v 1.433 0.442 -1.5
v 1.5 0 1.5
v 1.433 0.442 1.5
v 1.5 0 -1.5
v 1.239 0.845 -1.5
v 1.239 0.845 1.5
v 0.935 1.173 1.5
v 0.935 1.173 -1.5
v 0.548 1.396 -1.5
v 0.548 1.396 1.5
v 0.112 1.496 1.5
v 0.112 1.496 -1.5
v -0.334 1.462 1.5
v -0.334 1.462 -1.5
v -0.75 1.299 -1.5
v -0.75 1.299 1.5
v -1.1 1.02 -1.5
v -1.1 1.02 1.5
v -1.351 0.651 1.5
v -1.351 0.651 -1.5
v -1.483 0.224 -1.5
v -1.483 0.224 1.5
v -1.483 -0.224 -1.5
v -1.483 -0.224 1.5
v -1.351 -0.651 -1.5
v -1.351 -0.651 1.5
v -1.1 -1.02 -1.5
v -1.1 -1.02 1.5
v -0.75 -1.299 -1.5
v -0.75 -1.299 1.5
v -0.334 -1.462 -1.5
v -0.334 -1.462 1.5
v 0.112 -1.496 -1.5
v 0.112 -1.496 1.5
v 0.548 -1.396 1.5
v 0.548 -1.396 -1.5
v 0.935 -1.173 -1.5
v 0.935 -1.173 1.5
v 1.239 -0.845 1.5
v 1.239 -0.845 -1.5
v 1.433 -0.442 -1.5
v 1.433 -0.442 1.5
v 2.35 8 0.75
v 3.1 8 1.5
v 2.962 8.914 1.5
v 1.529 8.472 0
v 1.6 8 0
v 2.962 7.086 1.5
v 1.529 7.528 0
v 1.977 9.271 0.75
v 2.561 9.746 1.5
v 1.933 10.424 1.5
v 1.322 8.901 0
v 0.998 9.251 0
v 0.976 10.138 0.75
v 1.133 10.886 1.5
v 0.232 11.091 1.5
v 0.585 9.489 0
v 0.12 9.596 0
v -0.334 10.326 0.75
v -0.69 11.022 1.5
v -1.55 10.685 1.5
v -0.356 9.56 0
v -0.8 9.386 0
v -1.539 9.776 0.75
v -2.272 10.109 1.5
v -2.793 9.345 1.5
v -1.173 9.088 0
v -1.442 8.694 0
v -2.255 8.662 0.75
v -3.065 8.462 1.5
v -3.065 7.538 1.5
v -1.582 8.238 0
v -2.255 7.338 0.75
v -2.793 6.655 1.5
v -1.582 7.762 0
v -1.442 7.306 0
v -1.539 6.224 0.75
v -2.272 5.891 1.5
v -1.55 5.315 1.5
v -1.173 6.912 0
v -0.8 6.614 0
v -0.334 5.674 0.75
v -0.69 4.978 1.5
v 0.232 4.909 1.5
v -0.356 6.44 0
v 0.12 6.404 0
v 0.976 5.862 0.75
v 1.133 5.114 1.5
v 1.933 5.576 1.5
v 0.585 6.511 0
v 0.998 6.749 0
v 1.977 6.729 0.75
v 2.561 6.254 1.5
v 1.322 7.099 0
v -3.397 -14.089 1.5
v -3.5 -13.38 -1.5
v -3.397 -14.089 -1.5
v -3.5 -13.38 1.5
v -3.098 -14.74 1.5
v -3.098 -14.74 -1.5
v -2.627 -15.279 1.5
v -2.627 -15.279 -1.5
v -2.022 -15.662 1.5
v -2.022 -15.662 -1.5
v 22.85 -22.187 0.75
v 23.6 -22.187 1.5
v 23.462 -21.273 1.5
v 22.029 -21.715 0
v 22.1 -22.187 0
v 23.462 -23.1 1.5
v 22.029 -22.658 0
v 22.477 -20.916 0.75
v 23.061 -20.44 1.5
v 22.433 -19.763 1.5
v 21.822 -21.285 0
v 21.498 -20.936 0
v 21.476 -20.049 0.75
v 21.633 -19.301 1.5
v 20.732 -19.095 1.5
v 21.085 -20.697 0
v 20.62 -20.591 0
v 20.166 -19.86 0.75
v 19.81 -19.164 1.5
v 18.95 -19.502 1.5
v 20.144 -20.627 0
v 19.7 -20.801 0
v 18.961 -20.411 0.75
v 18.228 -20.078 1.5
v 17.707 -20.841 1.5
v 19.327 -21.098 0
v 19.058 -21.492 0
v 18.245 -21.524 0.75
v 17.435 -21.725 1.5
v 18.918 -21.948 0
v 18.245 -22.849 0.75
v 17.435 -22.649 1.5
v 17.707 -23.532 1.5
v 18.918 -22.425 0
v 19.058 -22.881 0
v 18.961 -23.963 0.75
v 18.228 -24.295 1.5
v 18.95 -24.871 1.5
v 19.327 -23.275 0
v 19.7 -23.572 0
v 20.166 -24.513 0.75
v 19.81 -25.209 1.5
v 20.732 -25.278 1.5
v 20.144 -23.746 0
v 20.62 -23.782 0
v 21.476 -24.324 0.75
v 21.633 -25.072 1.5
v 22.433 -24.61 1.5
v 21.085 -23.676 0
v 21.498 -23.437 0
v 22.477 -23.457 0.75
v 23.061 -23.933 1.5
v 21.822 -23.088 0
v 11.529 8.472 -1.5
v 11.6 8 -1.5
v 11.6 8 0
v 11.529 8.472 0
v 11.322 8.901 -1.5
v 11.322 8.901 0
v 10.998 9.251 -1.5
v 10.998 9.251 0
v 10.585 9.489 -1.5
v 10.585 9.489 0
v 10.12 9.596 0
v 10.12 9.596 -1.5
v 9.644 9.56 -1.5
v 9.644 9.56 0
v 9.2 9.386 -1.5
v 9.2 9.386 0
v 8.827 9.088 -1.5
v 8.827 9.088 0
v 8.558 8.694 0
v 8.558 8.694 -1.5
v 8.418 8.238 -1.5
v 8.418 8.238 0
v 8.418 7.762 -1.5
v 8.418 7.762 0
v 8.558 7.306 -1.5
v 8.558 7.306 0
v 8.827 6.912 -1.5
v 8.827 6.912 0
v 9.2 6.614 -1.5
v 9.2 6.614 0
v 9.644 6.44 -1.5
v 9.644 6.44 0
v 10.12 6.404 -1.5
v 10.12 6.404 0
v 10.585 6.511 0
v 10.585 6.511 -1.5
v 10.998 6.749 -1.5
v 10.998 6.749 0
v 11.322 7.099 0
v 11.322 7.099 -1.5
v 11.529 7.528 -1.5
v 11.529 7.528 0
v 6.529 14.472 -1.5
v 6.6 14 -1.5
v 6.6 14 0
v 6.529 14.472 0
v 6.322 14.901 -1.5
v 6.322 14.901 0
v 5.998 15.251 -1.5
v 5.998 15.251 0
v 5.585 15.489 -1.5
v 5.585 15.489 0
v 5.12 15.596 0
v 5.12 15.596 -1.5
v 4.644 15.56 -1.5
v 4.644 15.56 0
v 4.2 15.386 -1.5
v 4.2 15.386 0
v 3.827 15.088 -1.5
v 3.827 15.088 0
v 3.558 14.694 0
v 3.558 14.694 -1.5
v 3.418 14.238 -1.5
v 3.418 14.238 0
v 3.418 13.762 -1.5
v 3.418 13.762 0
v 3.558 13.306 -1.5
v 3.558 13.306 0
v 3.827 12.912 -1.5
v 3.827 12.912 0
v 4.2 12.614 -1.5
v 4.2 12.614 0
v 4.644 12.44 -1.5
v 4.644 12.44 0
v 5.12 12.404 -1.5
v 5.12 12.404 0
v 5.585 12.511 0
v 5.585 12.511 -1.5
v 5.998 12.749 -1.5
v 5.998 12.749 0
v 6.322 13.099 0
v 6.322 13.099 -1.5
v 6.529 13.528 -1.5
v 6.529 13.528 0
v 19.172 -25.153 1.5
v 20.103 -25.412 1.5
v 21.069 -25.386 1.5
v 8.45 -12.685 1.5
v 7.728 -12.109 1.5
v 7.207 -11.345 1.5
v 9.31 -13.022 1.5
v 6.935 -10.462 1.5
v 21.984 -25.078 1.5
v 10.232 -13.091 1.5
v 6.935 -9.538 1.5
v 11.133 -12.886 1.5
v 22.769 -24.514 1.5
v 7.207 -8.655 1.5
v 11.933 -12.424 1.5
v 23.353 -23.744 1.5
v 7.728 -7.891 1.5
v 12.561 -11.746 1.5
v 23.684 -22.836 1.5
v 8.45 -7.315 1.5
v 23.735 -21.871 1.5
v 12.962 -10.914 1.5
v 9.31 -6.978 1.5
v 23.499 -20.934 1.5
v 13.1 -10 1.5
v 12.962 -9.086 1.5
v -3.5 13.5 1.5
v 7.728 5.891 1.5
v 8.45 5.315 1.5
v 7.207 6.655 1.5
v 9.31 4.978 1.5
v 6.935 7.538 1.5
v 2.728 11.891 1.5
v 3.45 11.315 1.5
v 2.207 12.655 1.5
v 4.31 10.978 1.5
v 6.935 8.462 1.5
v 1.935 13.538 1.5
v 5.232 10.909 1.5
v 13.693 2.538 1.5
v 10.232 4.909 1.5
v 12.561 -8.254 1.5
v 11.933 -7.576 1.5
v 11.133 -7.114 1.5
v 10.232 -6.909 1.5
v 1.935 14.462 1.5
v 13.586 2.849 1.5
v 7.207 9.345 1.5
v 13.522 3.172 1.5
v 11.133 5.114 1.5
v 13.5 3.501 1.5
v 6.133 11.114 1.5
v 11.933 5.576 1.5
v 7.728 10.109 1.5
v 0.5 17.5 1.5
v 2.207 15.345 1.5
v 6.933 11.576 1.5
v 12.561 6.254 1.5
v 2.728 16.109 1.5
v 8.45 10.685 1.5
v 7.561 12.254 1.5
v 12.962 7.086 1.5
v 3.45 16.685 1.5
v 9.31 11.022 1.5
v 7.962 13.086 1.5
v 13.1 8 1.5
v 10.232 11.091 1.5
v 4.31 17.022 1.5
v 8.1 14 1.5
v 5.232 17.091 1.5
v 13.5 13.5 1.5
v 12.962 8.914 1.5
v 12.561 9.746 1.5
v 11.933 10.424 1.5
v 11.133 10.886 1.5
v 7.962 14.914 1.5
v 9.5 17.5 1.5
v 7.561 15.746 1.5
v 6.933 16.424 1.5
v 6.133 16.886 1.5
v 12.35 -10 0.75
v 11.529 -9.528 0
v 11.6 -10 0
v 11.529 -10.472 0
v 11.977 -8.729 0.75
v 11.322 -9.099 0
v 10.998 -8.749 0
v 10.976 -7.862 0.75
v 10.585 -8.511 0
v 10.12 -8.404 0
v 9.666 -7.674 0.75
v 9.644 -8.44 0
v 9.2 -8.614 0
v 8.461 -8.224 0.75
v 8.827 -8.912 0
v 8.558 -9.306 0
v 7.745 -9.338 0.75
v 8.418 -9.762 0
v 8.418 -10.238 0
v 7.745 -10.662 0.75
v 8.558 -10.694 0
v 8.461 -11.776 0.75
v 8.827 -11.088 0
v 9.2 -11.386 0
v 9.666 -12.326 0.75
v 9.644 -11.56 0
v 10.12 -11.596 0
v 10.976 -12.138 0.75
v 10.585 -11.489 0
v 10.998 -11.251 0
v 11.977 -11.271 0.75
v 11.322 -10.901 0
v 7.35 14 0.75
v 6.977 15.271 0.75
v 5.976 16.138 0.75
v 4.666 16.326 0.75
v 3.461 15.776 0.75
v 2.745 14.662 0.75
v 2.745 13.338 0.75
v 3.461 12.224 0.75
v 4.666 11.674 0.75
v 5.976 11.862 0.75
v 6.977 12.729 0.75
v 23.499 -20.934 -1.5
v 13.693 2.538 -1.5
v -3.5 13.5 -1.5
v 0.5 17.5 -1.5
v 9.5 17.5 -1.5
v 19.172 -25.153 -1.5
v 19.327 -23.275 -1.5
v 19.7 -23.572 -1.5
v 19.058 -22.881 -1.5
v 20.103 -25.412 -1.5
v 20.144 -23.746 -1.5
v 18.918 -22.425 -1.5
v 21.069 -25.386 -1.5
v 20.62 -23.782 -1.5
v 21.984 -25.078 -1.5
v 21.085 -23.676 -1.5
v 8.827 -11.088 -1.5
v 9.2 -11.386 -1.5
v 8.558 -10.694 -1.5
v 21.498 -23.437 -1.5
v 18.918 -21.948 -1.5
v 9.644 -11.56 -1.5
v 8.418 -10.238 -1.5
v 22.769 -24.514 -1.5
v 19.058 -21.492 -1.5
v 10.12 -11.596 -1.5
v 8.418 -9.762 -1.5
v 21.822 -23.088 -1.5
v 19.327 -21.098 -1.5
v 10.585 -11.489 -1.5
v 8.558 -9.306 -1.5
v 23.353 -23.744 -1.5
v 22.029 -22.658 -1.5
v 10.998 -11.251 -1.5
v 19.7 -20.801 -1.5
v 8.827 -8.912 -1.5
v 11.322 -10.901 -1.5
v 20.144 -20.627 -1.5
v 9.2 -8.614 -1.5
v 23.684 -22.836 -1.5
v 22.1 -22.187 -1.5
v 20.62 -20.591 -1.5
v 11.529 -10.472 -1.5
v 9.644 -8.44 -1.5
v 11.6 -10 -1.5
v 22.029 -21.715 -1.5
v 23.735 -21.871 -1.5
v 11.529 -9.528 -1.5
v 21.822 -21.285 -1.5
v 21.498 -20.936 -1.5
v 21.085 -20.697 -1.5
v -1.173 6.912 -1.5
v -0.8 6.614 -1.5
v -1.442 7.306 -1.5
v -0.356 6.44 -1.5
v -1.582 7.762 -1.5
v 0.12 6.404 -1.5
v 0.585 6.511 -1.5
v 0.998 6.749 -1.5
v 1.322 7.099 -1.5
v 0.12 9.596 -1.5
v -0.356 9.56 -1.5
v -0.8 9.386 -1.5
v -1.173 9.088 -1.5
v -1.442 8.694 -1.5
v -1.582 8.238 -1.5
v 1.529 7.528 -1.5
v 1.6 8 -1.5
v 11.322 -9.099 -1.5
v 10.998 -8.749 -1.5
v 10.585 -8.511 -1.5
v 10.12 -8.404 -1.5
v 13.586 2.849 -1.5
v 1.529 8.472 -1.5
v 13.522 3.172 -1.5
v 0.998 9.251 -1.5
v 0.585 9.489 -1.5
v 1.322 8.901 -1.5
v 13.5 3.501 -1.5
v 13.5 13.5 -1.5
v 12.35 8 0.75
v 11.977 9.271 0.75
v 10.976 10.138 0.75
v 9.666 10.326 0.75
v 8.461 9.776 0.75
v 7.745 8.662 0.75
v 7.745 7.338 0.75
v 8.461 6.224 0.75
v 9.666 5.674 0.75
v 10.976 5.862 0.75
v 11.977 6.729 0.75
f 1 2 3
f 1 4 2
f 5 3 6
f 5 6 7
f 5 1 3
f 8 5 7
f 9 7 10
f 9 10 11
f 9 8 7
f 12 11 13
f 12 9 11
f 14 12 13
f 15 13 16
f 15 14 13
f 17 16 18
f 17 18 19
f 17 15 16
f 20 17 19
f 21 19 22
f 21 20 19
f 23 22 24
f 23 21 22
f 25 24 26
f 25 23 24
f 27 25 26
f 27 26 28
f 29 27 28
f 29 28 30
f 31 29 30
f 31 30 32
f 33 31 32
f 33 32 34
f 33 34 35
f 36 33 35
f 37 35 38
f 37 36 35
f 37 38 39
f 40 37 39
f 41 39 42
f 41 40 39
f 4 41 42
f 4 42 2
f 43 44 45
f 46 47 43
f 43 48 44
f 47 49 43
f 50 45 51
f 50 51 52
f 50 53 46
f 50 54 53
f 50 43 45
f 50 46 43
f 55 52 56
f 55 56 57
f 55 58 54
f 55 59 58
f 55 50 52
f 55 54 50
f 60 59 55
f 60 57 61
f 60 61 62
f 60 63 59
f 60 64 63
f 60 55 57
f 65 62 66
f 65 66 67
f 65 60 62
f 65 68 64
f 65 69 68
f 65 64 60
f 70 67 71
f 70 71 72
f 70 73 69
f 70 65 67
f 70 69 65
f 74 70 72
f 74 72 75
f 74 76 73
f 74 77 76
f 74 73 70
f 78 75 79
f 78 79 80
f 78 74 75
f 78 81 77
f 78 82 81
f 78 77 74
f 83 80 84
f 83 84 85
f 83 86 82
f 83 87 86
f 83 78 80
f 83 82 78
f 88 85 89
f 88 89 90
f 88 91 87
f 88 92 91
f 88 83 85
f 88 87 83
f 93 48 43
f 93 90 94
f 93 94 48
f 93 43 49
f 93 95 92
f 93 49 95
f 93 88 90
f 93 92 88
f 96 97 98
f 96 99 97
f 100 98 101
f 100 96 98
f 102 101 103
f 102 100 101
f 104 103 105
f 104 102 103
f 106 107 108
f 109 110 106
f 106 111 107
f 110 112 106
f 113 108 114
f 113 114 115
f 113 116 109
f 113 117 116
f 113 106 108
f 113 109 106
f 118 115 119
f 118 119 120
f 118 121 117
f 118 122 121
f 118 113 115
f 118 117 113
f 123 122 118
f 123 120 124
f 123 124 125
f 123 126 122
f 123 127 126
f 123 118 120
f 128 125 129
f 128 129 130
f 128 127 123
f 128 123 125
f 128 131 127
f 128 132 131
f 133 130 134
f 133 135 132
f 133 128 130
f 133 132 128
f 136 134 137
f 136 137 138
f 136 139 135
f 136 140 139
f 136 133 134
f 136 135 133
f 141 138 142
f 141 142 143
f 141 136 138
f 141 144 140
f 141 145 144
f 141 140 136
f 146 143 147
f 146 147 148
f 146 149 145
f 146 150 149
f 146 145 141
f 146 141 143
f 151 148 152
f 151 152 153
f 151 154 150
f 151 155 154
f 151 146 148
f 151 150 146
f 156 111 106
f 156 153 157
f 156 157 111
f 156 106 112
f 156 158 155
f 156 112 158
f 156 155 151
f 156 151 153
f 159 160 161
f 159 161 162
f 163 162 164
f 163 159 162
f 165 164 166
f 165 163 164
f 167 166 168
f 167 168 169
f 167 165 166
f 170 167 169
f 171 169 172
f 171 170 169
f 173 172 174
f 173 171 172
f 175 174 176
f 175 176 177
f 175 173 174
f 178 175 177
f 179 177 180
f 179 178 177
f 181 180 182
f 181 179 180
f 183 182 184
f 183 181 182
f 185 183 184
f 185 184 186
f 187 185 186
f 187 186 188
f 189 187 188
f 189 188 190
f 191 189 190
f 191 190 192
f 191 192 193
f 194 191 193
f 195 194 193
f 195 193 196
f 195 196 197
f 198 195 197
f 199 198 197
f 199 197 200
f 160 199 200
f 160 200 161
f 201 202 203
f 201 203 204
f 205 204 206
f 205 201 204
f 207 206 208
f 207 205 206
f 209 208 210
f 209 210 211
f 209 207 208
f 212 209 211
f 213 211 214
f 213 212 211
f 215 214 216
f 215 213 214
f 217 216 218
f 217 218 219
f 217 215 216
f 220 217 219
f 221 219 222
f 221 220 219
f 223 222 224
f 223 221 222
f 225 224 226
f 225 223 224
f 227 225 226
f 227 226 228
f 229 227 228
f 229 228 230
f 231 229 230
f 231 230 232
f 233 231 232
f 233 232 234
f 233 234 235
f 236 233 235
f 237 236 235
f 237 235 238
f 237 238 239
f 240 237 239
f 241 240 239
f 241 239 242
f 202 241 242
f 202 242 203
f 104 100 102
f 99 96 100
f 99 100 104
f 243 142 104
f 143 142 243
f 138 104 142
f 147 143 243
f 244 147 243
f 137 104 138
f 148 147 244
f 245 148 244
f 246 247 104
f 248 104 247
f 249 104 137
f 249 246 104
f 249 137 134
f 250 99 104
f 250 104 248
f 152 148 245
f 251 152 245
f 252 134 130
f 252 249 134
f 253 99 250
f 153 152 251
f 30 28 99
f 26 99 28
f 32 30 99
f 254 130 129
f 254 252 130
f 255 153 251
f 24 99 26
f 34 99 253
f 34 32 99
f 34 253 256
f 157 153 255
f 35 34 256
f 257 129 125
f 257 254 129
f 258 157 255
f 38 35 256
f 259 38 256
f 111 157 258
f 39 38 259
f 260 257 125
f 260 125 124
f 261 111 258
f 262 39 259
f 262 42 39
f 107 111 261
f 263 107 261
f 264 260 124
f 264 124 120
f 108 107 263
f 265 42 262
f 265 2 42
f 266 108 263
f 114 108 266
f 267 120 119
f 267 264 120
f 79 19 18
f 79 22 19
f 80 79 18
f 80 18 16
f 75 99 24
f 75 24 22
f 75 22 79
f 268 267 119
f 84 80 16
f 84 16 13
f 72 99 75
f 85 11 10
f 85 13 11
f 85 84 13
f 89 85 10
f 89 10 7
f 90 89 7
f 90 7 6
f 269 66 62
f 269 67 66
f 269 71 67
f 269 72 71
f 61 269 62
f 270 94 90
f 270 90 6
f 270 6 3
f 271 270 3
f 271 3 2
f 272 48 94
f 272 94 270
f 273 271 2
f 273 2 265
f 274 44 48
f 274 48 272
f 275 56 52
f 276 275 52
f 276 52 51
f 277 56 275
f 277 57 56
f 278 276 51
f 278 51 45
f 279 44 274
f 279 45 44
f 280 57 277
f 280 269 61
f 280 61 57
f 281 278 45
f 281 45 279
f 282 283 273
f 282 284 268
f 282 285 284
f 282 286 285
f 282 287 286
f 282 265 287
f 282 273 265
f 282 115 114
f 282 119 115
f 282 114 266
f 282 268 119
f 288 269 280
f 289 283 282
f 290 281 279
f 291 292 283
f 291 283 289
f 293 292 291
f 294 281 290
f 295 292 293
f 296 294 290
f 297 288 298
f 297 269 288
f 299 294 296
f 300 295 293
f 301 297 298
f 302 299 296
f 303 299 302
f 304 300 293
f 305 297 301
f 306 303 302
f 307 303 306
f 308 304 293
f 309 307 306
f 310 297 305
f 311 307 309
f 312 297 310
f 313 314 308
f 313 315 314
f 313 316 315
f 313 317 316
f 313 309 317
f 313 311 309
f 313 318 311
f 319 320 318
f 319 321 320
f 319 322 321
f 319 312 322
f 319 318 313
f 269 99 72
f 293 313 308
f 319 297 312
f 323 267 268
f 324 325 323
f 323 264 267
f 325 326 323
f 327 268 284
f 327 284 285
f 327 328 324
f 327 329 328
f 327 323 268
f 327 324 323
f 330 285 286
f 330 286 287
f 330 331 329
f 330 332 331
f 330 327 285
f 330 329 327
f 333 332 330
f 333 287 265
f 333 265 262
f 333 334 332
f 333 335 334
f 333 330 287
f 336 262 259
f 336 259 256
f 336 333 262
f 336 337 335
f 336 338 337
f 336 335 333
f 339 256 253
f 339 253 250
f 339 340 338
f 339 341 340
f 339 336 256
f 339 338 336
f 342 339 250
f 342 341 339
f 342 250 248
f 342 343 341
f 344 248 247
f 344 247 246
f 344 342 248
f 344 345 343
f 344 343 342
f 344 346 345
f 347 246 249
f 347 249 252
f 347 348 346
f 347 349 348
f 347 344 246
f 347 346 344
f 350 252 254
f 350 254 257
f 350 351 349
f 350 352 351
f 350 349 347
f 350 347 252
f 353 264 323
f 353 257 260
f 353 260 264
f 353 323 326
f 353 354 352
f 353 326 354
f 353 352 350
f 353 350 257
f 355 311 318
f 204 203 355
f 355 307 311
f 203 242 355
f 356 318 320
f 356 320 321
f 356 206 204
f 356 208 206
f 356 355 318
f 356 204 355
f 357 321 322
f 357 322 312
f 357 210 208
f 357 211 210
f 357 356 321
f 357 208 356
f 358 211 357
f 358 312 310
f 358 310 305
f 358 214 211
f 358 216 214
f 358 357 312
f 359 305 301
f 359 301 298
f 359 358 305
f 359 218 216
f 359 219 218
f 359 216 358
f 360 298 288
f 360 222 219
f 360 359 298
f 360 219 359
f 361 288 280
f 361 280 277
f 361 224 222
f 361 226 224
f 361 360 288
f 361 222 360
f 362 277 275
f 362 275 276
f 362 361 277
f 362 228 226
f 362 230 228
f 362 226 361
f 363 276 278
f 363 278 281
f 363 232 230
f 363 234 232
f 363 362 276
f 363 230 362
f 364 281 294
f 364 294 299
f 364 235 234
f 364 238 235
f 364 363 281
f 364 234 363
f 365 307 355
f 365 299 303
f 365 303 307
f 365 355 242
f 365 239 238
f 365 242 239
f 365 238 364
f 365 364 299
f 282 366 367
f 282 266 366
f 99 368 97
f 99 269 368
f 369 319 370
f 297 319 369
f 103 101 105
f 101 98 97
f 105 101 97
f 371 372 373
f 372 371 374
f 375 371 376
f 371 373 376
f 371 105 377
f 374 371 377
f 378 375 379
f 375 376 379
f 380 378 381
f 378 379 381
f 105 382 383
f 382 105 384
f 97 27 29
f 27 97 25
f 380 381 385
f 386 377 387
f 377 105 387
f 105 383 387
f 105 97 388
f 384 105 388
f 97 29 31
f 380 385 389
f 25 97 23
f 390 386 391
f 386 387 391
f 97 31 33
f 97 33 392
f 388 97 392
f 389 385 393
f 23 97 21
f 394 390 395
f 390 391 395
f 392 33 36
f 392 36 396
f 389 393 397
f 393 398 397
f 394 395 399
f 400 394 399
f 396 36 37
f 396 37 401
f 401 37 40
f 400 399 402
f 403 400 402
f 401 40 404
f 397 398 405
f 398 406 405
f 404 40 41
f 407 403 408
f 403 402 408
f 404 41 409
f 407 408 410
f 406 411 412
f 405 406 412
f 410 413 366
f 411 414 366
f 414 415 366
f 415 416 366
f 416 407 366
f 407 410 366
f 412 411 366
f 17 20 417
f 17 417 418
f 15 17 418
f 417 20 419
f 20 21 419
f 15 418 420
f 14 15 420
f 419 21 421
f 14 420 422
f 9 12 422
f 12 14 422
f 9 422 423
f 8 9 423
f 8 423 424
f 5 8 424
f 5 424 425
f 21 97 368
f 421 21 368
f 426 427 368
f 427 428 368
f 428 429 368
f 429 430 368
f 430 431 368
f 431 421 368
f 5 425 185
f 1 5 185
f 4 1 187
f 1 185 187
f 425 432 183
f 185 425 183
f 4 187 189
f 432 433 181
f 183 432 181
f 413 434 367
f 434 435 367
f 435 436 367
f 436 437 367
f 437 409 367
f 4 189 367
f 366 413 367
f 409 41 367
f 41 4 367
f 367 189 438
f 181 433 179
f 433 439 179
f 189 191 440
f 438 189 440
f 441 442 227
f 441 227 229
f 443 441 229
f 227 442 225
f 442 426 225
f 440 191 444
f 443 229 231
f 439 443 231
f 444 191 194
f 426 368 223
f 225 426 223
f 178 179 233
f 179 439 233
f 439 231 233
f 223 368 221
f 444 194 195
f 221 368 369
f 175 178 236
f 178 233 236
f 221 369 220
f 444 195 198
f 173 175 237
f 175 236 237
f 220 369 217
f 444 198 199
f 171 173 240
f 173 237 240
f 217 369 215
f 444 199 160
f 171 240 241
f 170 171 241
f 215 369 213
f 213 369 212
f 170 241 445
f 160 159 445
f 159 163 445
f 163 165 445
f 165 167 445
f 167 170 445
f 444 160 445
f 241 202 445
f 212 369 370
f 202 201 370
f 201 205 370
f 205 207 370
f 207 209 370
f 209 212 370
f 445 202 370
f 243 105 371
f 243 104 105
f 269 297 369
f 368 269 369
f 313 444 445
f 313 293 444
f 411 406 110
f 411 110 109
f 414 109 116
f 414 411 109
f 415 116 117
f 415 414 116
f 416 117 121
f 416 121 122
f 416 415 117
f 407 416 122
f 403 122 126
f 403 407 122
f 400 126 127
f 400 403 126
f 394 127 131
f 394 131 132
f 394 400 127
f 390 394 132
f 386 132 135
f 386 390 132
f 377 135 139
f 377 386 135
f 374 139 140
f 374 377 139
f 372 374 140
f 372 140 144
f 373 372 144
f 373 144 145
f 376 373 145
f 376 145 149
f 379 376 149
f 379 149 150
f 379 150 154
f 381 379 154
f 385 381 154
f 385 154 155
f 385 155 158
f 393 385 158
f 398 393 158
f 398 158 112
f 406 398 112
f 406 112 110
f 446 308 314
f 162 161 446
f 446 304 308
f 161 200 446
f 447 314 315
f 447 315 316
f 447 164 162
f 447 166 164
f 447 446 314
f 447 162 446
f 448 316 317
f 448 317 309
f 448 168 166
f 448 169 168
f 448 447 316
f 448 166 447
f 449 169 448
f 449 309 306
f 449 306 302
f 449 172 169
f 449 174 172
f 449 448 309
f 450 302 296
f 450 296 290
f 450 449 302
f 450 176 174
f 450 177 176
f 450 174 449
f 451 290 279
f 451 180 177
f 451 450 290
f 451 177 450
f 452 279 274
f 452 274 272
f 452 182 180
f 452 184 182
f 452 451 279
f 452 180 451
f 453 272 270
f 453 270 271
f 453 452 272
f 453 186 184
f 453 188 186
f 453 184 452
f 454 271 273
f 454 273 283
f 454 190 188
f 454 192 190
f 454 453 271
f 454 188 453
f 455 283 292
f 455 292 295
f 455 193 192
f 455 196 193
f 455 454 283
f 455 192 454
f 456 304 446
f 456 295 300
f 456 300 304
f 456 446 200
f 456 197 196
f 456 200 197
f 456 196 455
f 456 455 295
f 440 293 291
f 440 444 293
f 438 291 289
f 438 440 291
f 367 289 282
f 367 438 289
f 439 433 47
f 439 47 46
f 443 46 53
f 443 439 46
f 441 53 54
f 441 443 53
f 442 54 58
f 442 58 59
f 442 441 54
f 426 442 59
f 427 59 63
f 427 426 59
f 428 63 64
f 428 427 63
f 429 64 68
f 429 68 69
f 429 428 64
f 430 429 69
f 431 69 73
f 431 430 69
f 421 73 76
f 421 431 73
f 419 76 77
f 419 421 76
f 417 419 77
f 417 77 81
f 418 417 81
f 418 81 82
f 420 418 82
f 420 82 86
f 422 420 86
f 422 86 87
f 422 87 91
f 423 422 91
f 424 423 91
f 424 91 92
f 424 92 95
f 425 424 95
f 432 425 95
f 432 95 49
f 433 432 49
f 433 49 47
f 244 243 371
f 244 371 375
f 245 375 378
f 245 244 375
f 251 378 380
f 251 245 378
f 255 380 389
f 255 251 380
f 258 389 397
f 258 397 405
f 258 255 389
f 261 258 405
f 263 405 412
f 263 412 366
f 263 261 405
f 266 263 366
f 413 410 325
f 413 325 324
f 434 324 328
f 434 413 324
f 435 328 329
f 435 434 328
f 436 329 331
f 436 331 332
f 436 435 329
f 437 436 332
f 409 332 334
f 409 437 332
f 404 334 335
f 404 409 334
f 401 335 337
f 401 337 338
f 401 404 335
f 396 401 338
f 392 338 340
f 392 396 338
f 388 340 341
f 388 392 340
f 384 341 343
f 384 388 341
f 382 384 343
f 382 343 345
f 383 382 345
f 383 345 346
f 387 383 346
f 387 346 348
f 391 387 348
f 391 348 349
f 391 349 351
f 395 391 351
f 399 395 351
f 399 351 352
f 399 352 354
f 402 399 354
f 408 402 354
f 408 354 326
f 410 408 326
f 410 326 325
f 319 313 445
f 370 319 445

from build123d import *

# Parameters (mm, degrees)
SKETCH_1_R      = 1.5
SKETCH_1_R_2    = 1.6
EXTRUDE_1_DEPTH = 1.5
CHAMFER_1_SIZE  = 1.5
FILLET_1_R      = 2.5
CHAMFER_2_SIZE  = 4


with BuildPart() as part:
    # 草图1 → 凸台-拉伸1 (new, symmetric)
    with BuildSketch(Plane.XY):
        with BuildLine():
            Line((-3.5, 17.5), (-3.5, -15))
            Line((-3.5, -15), (19.171710101, -25.152700357))
            ThreePointArc((19.171710101, -25.152700357), (22.768840587, -24.513519167), (23.498822385, -20.933710945))
            Line((23.498822385, -20.933710945), (13.5, 3))
            Line((13.5, 3), (13.5, 17.5))
            Line((13.5, 17.5), (-3.5, 17.5))
        make_face()
        Circle(SKETCH_1_R, mode=Mode.SUBTRACT)
        with Locations((10, -10)):
            Circle(SKETCH_1_R_2, mode=Mode.SUBTRACT)
        with Locations((20.5, -22.186533479)):
            Circle(SKETCH_1_R_2, mode=Mode.SUBTRACT)
        with Locations((0, 8)):
            Circle(SKETCH_1_R_2, mode=Mode.SUBTRACT)
        with Locations((10, 8)):
            Circle(SKETCH_1_R_2, mode=Mode.SUBTRACT)
        with Locations((5, 14)):
            Circle(SKETCH_1_R_2, mode=Mode.SUBTRACT)
    extrude(amount=EXTRUDE_1_DEPTH, both=True)

    # 倒角1
    chamfer_1_edges = [part.edges().sort_by_distance(p)[0] for p in [
        (8.4, -10, 1.5),
        (18.9, -22.186533479, 1.5),
        (-1.6, 8, 1.5),
        (8.4, 8, 1.5),
        (3.4, 14, 1.5),
    ]]
    chamfer(chamfer_1_edges, length=CHAMFER_1_SIZE)

    # 圆角1
    fillet_1_edges = [part.edges().sort_by_distance(p)[0] for p in [
        (13.5, 3, 0),
        (-3.5, -15, 0),
    ]]
    fillet(fillet_1_edges, radius=FILLET_1_R)

    # 倒角2
    chamfer_2_edges = [part.edges().sort_by_distance(p)[0] for p in [
        (13.5, 17.5, 0),
        (-3.5, 17.5, 0),
    ]]
    chamfer(chamfer_2_edges, length=CHAMFER_2_SIZE)


solid = part.part
